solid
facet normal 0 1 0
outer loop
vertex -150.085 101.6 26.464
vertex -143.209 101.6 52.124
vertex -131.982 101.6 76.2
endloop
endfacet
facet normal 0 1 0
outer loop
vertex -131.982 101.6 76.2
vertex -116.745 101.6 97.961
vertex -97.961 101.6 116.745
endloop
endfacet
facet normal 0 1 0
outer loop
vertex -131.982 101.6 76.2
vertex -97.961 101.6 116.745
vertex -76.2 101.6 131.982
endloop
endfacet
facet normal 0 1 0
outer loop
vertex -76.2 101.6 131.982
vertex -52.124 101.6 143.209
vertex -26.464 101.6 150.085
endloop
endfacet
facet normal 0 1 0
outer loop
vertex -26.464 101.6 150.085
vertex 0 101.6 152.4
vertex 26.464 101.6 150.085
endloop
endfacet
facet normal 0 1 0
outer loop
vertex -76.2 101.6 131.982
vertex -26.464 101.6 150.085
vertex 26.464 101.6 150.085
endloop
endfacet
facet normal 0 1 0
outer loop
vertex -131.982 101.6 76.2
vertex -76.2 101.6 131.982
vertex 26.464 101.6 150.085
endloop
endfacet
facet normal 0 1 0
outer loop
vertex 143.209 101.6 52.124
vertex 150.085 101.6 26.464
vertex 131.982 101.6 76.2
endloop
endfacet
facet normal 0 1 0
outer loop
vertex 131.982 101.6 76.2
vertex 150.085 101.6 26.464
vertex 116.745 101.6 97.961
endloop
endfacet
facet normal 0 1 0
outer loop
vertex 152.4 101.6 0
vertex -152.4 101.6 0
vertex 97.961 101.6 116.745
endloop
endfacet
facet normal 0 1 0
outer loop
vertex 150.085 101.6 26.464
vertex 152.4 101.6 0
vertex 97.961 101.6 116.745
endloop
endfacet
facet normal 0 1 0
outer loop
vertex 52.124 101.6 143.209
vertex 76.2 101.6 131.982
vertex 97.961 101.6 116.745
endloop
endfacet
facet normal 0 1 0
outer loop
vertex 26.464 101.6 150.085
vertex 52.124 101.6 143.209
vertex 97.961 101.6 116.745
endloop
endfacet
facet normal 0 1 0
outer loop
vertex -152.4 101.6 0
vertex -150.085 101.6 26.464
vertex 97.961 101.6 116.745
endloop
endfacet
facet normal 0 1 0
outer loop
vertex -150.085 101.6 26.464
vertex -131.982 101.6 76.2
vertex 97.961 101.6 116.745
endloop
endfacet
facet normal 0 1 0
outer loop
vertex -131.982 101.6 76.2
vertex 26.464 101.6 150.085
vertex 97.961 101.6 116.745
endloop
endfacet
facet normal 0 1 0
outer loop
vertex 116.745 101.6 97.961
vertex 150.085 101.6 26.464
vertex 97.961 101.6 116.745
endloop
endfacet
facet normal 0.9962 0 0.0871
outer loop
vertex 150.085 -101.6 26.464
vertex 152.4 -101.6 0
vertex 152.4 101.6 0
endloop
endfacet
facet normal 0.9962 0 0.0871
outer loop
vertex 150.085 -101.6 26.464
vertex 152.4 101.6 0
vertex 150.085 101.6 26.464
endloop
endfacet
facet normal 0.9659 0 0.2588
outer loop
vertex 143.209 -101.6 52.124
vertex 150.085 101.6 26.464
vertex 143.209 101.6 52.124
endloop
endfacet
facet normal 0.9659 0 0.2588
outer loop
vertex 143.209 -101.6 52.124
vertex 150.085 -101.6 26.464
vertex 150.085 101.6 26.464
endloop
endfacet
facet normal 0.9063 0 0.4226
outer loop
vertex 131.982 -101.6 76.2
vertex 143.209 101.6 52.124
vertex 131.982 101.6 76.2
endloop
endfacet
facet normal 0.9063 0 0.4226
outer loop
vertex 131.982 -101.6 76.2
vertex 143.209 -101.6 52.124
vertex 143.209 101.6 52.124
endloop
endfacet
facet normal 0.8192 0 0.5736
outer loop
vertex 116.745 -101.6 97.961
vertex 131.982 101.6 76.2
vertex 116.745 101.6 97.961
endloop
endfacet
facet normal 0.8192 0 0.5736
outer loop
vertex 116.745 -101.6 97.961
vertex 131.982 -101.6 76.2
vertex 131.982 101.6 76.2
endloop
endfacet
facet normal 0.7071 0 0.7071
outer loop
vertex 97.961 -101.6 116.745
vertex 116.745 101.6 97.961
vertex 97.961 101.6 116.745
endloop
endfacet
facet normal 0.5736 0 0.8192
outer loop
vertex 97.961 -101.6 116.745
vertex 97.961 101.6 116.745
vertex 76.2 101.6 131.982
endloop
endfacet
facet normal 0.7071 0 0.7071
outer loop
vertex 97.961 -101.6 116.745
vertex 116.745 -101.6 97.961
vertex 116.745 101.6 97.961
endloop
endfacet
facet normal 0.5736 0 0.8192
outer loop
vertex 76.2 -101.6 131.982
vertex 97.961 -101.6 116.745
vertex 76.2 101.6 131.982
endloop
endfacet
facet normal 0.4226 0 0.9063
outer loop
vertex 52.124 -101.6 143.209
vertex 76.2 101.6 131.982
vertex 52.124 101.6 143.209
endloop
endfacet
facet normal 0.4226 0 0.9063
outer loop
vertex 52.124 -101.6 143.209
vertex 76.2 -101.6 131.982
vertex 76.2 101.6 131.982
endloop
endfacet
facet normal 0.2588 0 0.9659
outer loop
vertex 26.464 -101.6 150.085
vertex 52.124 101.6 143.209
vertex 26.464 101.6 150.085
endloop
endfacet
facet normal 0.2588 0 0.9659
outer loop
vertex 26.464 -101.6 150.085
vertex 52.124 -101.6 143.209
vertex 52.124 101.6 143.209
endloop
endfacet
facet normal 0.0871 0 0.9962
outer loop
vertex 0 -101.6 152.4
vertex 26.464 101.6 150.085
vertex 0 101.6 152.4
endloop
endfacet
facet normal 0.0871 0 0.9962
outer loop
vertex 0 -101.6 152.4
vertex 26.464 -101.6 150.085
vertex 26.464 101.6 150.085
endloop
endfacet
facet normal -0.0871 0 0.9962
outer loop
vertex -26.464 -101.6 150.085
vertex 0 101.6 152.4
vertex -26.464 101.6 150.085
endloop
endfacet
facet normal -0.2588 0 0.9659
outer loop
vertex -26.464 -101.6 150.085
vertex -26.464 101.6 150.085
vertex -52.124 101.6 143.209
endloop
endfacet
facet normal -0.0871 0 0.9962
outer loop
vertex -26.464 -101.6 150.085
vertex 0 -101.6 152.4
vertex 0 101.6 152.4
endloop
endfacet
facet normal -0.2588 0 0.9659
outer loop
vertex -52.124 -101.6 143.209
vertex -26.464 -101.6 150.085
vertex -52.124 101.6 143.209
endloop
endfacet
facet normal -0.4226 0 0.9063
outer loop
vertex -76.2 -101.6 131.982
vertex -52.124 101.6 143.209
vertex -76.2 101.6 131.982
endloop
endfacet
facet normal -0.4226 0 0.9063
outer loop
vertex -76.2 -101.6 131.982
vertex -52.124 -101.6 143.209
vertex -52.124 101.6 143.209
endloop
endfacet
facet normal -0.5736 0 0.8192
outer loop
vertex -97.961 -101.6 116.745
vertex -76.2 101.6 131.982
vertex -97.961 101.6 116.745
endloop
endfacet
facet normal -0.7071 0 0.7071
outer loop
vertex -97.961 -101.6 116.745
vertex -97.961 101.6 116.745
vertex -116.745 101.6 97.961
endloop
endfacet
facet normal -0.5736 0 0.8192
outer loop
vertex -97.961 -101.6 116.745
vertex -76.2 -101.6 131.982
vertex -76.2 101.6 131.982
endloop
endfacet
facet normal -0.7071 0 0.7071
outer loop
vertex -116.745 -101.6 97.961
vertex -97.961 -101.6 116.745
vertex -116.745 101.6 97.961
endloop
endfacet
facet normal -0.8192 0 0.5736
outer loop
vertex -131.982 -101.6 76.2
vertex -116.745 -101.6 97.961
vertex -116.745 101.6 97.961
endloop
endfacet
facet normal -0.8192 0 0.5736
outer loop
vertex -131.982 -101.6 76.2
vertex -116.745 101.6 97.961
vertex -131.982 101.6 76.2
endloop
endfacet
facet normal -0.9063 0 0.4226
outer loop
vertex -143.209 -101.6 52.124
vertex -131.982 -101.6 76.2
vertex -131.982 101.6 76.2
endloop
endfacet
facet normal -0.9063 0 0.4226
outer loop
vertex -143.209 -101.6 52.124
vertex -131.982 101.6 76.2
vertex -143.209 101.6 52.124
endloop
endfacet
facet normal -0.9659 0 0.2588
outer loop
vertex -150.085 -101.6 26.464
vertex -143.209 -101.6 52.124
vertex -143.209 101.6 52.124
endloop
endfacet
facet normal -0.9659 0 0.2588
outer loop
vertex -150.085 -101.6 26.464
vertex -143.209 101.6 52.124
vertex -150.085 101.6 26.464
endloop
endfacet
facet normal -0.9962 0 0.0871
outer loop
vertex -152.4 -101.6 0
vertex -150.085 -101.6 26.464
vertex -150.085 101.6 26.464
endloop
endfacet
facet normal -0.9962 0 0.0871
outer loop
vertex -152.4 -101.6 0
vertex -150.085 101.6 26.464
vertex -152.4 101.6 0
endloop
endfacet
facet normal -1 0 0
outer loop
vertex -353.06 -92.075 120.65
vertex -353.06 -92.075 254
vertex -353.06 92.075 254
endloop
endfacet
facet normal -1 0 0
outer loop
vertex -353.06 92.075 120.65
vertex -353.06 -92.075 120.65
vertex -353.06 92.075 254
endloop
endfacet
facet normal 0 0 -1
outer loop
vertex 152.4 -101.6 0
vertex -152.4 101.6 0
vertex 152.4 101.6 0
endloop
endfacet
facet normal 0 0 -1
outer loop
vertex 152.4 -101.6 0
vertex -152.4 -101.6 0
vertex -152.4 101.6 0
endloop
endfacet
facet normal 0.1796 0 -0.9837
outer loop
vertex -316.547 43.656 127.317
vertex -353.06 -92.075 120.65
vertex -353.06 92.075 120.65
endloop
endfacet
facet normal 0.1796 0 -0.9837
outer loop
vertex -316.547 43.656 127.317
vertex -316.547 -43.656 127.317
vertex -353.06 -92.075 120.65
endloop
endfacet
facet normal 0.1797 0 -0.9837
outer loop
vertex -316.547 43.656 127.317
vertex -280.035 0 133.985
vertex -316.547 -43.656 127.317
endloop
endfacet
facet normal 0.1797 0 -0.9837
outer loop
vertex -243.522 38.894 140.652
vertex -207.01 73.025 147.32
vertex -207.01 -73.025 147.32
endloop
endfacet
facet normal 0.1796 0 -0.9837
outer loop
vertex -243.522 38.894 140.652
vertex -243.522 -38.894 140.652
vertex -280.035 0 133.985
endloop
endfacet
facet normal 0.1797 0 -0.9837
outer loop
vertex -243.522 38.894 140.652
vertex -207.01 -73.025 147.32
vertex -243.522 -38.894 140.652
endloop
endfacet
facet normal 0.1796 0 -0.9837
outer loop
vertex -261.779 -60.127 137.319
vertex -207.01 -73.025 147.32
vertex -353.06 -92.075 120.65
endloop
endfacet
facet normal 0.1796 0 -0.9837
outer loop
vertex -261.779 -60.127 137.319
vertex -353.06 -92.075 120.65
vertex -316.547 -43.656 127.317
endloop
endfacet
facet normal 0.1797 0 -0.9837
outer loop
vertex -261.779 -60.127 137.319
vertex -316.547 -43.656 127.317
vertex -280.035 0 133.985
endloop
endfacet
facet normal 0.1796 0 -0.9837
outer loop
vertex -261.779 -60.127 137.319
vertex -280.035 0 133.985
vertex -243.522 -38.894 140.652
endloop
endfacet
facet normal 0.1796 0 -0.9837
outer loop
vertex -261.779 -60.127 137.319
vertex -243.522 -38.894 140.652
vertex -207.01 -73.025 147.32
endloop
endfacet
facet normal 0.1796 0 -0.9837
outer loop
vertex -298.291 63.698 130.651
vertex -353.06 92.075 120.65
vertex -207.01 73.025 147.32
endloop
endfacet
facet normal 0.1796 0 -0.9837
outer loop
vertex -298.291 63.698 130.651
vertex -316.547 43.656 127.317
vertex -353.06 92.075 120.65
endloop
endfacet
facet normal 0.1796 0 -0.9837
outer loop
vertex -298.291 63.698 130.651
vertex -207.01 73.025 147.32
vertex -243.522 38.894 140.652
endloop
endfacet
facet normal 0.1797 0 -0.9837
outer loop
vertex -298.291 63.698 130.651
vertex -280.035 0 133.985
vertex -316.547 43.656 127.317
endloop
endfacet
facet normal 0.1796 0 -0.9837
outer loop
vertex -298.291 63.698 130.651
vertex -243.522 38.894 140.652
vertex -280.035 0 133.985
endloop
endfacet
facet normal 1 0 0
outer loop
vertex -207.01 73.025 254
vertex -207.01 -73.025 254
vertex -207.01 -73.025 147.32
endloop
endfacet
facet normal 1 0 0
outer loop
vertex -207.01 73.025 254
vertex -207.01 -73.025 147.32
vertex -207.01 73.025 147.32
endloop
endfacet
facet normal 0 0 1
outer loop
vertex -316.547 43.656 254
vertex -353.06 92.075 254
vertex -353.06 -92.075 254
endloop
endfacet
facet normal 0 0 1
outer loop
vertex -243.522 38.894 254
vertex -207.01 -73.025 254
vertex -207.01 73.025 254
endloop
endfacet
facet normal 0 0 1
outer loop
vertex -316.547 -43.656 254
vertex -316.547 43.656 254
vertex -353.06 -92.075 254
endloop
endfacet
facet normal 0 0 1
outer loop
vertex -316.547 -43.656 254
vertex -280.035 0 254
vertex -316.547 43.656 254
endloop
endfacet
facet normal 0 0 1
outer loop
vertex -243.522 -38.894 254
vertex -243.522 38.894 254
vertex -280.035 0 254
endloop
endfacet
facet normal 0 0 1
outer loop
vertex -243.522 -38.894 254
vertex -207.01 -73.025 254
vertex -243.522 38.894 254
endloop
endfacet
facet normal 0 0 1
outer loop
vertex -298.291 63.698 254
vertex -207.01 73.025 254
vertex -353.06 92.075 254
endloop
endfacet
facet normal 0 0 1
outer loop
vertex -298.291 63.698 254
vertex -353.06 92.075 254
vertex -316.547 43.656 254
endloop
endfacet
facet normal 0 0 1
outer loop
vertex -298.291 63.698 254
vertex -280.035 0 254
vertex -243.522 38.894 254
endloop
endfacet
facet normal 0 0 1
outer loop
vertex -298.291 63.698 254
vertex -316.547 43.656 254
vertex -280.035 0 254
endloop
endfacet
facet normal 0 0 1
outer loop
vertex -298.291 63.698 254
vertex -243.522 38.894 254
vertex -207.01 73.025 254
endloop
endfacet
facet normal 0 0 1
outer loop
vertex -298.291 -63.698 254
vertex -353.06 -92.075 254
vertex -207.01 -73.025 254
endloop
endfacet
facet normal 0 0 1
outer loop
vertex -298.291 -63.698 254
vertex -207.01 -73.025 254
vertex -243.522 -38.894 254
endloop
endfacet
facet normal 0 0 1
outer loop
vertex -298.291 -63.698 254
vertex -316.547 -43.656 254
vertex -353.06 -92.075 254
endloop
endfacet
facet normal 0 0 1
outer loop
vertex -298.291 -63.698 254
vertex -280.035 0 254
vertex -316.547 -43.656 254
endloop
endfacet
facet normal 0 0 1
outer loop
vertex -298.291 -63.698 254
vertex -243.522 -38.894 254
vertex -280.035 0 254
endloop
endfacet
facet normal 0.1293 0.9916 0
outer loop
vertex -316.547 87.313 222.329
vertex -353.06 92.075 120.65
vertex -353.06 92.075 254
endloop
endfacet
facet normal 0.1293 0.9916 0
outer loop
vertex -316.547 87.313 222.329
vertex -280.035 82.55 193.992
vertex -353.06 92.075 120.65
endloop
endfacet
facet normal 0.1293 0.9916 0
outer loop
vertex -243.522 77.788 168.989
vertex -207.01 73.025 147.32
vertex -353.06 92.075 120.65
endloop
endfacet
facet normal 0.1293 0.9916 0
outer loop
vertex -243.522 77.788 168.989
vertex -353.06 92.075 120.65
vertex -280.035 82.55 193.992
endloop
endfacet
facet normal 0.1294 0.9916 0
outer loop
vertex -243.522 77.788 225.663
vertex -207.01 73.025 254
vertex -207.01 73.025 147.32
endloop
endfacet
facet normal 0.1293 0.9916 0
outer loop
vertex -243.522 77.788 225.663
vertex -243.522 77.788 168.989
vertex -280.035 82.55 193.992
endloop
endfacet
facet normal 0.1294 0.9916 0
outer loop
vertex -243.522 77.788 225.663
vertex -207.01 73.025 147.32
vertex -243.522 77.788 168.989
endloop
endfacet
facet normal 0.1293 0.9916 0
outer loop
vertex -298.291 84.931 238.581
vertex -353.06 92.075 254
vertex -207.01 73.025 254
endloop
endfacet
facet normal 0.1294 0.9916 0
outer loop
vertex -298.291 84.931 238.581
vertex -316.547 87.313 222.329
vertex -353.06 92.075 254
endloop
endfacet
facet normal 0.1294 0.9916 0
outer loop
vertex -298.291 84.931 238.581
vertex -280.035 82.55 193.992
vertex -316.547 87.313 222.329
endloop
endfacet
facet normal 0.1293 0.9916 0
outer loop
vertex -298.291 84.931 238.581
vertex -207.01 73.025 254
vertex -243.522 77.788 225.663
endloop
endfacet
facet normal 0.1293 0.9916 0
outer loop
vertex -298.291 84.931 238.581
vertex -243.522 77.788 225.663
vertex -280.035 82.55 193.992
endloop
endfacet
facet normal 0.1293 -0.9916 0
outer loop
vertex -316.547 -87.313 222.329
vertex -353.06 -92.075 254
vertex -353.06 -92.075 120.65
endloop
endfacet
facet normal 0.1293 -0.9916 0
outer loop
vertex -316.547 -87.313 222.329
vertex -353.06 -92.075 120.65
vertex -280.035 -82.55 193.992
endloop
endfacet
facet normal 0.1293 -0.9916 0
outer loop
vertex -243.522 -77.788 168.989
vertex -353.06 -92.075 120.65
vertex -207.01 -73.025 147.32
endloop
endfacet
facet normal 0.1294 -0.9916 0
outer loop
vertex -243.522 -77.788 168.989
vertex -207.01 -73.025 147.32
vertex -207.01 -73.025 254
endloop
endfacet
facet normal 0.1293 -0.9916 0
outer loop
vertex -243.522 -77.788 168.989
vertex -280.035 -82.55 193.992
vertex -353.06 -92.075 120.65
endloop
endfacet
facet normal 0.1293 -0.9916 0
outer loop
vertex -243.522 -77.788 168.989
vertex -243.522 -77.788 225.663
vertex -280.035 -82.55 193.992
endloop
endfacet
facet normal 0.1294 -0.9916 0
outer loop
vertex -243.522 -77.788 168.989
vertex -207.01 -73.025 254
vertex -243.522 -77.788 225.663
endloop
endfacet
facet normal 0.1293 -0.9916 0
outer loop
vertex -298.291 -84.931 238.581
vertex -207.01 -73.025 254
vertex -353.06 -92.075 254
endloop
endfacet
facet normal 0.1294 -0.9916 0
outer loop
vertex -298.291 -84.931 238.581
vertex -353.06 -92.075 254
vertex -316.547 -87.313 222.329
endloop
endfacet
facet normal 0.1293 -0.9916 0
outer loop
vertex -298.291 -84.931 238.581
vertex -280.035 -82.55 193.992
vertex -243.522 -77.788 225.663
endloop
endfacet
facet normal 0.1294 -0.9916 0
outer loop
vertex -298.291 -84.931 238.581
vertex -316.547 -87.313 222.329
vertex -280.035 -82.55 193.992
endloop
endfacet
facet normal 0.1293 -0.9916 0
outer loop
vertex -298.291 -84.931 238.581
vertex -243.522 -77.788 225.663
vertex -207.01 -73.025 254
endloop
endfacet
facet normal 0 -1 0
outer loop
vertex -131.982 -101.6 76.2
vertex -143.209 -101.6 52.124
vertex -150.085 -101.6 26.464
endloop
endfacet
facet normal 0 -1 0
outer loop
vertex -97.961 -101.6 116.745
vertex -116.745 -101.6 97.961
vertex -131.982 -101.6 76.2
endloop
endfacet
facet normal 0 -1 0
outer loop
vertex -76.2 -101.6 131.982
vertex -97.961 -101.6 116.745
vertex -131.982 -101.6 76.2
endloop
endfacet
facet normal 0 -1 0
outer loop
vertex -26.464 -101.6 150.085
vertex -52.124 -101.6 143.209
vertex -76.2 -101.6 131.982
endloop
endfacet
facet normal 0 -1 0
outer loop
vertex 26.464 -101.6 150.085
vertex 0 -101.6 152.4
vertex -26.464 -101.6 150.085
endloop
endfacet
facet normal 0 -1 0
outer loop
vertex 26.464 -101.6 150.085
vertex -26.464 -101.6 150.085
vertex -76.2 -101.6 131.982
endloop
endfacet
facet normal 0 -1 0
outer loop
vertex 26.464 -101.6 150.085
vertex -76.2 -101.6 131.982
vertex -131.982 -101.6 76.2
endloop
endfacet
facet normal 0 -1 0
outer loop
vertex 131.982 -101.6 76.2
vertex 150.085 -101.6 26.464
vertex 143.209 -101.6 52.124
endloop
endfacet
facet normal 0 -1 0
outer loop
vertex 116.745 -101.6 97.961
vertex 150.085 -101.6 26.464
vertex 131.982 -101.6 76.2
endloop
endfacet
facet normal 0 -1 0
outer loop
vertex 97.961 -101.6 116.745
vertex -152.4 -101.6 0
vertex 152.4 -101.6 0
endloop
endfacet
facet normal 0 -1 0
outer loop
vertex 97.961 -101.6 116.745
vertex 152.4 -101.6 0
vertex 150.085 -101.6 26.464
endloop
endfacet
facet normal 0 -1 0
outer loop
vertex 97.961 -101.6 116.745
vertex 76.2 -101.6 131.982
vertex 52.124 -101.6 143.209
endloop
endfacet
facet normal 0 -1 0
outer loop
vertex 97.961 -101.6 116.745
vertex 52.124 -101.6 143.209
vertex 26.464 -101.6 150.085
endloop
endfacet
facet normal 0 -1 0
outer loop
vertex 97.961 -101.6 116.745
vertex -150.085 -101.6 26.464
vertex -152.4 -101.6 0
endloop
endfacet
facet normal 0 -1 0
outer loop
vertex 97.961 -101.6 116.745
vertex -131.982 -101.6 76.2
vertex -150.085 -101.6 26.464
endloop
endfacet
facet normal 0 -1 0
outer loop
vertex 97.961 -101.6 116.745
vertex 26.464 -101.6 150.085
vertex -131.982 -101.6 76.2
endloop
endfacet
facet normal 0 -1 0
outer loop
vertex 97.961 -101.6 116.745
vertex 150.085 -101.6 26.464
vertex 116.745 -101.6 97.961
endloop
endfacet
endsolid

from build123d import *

# Parameters (mm, degrees)
F1_DEPTH = 101.6
F6_W     = 184.15
F6_H     = 133.35
F5_W     = 146.05
F5_H     = 106.68


with BuildPart() as f1:
    # F0 (on Front) → F1 (new body, symmetric)
    with BuildSketch(Plane.XZ):
        with BuildLine():
            Line((-152.4, 0), (152.4, 0))
            ThreePointArc((152.4, 0), (0, 152.4), (-152.4, 0))
        make_face()
    extrude(amount=F1_DEPTH, both=True)


with BuildPart() as f7:
    # F6 (on face) → F7 section 0
    with BuildSketch(Plane.YZ.offset(-353.06)):
        with Locations((0, 187.325)):
            Rectangle(F6_W, F6_H)
    # F5 (on face) → F7 section 1
    with BuildSketch(Plane.YZ.offset(-207.01)):
        with Locations((0, 200.66)):
            Rectangle(F5_W, F5_H)
    loft()


solid = Compound([f1.part, f7.part])
